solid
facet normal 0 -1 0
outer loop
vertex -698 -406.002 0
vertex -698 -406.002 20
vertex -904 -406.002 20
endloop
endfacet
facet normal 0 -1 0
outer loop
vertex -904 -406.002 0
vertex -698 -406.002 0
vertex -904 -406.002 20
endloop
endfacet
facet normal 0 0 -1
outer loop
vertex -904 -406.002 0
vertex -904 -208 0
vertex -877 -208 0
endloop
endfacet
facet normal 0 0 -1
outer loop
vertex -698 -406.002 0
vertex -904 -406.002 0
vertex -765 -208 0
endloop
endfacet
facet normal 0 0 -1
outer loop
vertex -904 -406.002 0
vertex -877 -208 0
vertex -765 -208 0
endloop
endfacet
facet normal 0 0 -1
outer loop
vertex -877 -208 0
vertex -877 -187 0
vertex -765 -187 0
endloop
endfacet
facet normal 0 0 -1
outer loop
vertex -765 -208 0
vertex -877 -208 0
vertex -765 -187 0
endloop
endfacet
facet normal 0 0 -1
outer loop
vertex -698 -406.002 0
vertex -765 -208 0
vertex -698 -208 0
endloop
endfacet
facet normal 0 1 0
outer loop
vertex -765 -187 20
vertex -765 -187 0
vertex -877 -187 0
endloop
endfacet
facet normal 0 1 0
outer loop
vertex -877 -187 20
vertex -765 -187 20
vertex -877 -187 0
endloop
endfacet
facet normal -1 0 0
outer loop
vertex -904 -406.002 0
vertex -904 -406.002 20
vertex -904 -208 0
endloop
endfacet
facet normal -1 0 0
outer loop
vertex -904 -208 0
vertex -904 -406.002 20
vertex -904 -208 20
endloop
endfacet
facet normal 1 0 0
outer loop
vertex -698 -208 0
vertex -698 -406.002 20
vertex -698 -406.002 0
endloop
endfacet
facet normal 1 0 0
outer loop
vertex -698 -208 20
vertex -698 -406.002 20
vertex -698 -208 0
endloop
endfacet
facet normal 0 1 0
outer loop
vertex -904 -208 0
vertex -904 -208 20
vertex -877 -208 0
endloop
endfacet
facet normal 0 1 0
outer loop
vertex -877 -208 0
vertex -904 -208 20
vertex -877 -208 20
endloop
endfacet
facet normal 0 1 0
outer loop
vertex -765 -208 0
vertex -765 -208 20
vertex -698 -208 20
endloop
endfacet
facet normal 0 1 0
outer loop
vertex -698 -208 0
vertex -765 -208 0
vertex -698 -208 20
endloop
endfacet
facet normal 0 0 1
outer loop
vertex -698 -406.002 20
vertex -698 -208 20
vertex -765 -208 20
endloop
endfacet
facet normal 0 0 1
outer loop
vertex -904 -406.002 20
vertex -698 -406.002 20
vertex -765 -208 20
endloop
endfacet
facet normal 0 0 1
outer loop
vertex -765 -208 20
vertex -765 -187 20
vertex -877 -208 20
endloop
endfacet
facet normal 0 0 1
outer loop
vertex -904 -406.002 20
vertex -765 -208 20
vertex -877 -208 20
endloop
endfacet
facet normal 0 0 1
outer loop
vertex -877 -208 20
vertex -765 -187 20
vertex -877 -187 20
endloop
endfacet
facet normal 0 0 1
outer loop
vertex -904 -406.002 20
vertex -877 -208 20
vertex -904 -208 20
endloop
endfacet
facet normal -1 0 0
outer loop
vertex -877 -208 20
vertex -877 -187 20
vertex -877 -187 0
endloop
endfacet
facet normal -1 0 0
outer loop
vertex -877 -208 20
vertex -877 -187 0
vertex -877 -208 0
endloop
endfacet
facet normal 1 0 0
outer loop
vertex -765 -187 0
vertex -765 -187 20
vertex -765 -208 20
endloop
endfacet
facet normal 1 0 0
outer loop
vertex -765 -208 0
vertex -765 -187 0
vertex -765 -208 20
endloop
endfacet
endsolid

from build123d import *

# Parameters (mm, degrees)
F3_DEPTH  = 240
F5_DEPTH  = 20
F6_W      = 112
F6_H      = 241.1060750484
F7_DEPTH  = 25
F8_W      = 70.001994
F8_H      = 85
F9_DEPTH  = 25
F10_W     = 50
F10_H     = 198.001994
F11_DEPTH = 50
F12_DEPTH = 240.001
F13_DEPTH = 70.001


with BuildPart() as f3:
    # F2 (on face) → F3 (new body)
    with BuildSketch(Plane.XY):
        Polygon((-627, -343.001994), (-627, -273), (-627, -187), (-765, -187), (-877, -187), (-925, -187), (-925, -427.001994), (-627, -427.001994), align=None)
        Polygon((-765, -208), (-648, -208), (-648, -273), (-648, -343.001994), (-648, -406.001994), (-904, -406.001994), (-904, -208), (-877, -208), align=None, mode=Mode.SUBTRACT)
    extrude(amount=F3_DEPTH)

    # F4 (on face) → F5 (join)
    with BuildSketch(Plane.XY):
        Polygon((-648, -273), (-648, -208), (-765, -208), (-877, -208), (-904, -208), (-904, -406.001994), (-648, -406.001994), (-648, -343.001994), align=None)
    extrude(amount=F5_DEPTH)

    # F6 (on face) → F7 (cut)
    with BuildSketch(Plane(origin=(0, -187, 0), x_dir=(-1, 0, 0), z_dir=(0, 1, 0))):
        with Locations((821, 140.5530375242)):
            Rectangle(F6_W, F6_H)
    extrude(amount=-F7_DEPTH, mode=Mode.SUBTRACT)

    # F8 (on face) → F9 (cut)
    with BuildSketch(Plane.YZ.offset(-627)):
        with Locations((-308.000997, 177.5)):
            Rectangle(F8_W, F8_H)
    extrude(amount=-F9_DEPTH, mode=Mode.SUBTRACT)

    # F10 (on face) → F11 (join)
    with BuildSketch(Plane.XY.offset(20)):
        with Locations((-673, -307.000997)):
            Rectangle(F10_W, F10_H)
    extrude(amount=F11_DEPTH)

    # F12 (cut, through all): a face of the model
    f12_faces = [f3.faces().sort_by_distance(p)[0] for p in [
        (-630.8262900716, -307.000997, 240),
    ]]
    extrude(f12_faces, amount=-F12_DEPTH, mode=Mode.SUBTRACT)

    # F13 (cut, through all): a face of the model
    f13_faces = [f3.faces().sort_by_distance(p)[0] for p in [
        (-673, -307.000997, 70),
    ]]
    extrude(f13_faces, amount=-F13_DEPTH, mode=Mode.SUBTRACT)


solid = f3.part
